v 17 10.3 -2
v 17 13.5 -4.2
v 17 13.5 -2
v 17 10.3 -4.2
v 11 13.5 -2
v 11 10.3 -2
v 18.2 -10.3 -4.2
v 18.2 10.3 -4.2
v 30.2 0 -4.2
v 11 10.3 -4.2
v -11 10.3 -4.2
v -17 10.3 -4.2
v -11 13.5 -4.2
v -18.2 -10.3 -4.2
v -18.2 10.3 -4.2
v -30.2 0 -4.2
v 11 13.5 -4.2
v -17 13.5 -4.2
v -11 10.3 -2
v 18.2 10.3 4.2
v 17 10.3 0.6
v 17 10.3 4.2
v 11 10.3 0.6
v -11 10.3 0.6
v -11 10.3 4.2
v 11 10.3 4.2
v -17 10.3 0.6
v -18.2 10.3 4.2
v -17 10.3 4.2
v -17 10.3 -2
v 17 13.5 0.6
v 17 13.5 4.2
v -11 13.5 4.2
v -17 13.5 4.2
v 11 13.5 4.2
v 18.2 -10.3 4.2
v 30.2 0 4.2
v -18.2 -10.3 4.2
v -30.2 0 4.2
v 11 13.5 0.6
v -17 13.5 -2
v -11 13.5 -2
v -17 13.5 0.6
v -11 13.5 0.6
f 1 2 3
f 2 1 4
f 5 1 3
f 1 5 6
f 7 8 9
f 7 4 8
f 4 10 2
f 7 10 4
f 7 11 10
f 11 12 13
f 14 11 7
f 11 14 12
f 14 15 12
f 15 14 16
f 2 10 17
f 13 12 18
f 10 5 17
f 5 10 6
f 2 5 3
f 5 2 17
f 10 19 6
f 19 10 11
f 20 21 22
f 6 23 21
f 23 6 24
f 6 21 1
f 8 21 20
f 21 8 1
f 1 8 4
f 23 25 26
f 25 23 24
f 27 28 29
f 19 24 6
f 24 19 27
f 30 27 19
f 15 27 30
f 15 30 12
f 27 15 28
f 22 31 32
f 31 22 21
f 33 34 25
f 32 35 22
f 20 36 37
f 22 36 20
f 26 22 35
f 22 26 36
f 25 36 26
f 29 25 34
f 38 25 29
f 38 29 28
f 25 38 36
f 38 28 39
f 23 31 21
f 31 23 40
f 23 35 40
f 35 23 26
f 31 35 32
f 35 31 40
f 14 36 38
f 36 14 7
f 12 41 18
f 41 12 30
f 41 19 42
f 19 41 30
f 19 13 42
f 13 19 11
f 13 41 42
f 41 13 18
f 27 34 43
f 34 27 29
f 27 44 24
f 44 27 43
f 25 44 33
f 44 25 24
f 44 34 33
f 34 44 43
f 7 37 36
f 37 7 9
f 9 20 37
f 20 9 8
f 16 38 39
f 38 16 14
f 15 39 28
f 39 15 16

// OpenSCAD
$fn=64;

L = 60.4;
W = 20.6;
H = 8.4;

tip_len = 12.0;
body_len = L - 2*tip_len;

fin_len = 6.0;
fin_out = 3.2;
fin_h1 = 2.2;
fin_h2 = 3.6;
fin_z1 = 0.0;
fin_z2 = H - fin_h2;

module arrow_tip(len, w, h){
    polyhedron(
        points=[
            [0, -w/2, 0],
            [0,  w/2, 0],
            [0,  w/2, h],
            [0, -w/2, h],
            [len, 0, 0],
            [len, 0, h]
        ],
        faces=[
            [0,1,2,3],
            [0,4,1],
            [0,3,5,4],
            [1,4,5,2],
            [3,2,5],
            [0,4,5,3]
        ]
    );
}

module fin_step(side=1){
    union(){
        translate([0, side*(W/2), fin_z1])
            cube([fin_len, fin_out, fin_h1], center=false);
        translate([0, side*(W/2), fin_z2])
            cube([fin_len, fin_out, fin_h2], center=false);
    }
}

module end_fins(x0){
    translate([x0,0,0]){
        fin_step(1);
        fin_step(-1);
    }
}

module indicator(){
    union(){
        translate([-body_len/2, -W/2, 0])
            cube([body_len, W, H], center=false);

        translate([body_len/2, 0, 0])
            arrow_tip(tip_len, W, H);

        mirror([1,0,0])
            translate([body_len/2, 0, 0])
                arrow_tip(tip_len, W, H);

        end_fins(body_len/2 - fin_len - 1.2);
        mirror([1,0,0]) end_fins(body_len/2 - fin_len - 1.2);
    }
}

translate([0,0,-H/2]) indicator();
